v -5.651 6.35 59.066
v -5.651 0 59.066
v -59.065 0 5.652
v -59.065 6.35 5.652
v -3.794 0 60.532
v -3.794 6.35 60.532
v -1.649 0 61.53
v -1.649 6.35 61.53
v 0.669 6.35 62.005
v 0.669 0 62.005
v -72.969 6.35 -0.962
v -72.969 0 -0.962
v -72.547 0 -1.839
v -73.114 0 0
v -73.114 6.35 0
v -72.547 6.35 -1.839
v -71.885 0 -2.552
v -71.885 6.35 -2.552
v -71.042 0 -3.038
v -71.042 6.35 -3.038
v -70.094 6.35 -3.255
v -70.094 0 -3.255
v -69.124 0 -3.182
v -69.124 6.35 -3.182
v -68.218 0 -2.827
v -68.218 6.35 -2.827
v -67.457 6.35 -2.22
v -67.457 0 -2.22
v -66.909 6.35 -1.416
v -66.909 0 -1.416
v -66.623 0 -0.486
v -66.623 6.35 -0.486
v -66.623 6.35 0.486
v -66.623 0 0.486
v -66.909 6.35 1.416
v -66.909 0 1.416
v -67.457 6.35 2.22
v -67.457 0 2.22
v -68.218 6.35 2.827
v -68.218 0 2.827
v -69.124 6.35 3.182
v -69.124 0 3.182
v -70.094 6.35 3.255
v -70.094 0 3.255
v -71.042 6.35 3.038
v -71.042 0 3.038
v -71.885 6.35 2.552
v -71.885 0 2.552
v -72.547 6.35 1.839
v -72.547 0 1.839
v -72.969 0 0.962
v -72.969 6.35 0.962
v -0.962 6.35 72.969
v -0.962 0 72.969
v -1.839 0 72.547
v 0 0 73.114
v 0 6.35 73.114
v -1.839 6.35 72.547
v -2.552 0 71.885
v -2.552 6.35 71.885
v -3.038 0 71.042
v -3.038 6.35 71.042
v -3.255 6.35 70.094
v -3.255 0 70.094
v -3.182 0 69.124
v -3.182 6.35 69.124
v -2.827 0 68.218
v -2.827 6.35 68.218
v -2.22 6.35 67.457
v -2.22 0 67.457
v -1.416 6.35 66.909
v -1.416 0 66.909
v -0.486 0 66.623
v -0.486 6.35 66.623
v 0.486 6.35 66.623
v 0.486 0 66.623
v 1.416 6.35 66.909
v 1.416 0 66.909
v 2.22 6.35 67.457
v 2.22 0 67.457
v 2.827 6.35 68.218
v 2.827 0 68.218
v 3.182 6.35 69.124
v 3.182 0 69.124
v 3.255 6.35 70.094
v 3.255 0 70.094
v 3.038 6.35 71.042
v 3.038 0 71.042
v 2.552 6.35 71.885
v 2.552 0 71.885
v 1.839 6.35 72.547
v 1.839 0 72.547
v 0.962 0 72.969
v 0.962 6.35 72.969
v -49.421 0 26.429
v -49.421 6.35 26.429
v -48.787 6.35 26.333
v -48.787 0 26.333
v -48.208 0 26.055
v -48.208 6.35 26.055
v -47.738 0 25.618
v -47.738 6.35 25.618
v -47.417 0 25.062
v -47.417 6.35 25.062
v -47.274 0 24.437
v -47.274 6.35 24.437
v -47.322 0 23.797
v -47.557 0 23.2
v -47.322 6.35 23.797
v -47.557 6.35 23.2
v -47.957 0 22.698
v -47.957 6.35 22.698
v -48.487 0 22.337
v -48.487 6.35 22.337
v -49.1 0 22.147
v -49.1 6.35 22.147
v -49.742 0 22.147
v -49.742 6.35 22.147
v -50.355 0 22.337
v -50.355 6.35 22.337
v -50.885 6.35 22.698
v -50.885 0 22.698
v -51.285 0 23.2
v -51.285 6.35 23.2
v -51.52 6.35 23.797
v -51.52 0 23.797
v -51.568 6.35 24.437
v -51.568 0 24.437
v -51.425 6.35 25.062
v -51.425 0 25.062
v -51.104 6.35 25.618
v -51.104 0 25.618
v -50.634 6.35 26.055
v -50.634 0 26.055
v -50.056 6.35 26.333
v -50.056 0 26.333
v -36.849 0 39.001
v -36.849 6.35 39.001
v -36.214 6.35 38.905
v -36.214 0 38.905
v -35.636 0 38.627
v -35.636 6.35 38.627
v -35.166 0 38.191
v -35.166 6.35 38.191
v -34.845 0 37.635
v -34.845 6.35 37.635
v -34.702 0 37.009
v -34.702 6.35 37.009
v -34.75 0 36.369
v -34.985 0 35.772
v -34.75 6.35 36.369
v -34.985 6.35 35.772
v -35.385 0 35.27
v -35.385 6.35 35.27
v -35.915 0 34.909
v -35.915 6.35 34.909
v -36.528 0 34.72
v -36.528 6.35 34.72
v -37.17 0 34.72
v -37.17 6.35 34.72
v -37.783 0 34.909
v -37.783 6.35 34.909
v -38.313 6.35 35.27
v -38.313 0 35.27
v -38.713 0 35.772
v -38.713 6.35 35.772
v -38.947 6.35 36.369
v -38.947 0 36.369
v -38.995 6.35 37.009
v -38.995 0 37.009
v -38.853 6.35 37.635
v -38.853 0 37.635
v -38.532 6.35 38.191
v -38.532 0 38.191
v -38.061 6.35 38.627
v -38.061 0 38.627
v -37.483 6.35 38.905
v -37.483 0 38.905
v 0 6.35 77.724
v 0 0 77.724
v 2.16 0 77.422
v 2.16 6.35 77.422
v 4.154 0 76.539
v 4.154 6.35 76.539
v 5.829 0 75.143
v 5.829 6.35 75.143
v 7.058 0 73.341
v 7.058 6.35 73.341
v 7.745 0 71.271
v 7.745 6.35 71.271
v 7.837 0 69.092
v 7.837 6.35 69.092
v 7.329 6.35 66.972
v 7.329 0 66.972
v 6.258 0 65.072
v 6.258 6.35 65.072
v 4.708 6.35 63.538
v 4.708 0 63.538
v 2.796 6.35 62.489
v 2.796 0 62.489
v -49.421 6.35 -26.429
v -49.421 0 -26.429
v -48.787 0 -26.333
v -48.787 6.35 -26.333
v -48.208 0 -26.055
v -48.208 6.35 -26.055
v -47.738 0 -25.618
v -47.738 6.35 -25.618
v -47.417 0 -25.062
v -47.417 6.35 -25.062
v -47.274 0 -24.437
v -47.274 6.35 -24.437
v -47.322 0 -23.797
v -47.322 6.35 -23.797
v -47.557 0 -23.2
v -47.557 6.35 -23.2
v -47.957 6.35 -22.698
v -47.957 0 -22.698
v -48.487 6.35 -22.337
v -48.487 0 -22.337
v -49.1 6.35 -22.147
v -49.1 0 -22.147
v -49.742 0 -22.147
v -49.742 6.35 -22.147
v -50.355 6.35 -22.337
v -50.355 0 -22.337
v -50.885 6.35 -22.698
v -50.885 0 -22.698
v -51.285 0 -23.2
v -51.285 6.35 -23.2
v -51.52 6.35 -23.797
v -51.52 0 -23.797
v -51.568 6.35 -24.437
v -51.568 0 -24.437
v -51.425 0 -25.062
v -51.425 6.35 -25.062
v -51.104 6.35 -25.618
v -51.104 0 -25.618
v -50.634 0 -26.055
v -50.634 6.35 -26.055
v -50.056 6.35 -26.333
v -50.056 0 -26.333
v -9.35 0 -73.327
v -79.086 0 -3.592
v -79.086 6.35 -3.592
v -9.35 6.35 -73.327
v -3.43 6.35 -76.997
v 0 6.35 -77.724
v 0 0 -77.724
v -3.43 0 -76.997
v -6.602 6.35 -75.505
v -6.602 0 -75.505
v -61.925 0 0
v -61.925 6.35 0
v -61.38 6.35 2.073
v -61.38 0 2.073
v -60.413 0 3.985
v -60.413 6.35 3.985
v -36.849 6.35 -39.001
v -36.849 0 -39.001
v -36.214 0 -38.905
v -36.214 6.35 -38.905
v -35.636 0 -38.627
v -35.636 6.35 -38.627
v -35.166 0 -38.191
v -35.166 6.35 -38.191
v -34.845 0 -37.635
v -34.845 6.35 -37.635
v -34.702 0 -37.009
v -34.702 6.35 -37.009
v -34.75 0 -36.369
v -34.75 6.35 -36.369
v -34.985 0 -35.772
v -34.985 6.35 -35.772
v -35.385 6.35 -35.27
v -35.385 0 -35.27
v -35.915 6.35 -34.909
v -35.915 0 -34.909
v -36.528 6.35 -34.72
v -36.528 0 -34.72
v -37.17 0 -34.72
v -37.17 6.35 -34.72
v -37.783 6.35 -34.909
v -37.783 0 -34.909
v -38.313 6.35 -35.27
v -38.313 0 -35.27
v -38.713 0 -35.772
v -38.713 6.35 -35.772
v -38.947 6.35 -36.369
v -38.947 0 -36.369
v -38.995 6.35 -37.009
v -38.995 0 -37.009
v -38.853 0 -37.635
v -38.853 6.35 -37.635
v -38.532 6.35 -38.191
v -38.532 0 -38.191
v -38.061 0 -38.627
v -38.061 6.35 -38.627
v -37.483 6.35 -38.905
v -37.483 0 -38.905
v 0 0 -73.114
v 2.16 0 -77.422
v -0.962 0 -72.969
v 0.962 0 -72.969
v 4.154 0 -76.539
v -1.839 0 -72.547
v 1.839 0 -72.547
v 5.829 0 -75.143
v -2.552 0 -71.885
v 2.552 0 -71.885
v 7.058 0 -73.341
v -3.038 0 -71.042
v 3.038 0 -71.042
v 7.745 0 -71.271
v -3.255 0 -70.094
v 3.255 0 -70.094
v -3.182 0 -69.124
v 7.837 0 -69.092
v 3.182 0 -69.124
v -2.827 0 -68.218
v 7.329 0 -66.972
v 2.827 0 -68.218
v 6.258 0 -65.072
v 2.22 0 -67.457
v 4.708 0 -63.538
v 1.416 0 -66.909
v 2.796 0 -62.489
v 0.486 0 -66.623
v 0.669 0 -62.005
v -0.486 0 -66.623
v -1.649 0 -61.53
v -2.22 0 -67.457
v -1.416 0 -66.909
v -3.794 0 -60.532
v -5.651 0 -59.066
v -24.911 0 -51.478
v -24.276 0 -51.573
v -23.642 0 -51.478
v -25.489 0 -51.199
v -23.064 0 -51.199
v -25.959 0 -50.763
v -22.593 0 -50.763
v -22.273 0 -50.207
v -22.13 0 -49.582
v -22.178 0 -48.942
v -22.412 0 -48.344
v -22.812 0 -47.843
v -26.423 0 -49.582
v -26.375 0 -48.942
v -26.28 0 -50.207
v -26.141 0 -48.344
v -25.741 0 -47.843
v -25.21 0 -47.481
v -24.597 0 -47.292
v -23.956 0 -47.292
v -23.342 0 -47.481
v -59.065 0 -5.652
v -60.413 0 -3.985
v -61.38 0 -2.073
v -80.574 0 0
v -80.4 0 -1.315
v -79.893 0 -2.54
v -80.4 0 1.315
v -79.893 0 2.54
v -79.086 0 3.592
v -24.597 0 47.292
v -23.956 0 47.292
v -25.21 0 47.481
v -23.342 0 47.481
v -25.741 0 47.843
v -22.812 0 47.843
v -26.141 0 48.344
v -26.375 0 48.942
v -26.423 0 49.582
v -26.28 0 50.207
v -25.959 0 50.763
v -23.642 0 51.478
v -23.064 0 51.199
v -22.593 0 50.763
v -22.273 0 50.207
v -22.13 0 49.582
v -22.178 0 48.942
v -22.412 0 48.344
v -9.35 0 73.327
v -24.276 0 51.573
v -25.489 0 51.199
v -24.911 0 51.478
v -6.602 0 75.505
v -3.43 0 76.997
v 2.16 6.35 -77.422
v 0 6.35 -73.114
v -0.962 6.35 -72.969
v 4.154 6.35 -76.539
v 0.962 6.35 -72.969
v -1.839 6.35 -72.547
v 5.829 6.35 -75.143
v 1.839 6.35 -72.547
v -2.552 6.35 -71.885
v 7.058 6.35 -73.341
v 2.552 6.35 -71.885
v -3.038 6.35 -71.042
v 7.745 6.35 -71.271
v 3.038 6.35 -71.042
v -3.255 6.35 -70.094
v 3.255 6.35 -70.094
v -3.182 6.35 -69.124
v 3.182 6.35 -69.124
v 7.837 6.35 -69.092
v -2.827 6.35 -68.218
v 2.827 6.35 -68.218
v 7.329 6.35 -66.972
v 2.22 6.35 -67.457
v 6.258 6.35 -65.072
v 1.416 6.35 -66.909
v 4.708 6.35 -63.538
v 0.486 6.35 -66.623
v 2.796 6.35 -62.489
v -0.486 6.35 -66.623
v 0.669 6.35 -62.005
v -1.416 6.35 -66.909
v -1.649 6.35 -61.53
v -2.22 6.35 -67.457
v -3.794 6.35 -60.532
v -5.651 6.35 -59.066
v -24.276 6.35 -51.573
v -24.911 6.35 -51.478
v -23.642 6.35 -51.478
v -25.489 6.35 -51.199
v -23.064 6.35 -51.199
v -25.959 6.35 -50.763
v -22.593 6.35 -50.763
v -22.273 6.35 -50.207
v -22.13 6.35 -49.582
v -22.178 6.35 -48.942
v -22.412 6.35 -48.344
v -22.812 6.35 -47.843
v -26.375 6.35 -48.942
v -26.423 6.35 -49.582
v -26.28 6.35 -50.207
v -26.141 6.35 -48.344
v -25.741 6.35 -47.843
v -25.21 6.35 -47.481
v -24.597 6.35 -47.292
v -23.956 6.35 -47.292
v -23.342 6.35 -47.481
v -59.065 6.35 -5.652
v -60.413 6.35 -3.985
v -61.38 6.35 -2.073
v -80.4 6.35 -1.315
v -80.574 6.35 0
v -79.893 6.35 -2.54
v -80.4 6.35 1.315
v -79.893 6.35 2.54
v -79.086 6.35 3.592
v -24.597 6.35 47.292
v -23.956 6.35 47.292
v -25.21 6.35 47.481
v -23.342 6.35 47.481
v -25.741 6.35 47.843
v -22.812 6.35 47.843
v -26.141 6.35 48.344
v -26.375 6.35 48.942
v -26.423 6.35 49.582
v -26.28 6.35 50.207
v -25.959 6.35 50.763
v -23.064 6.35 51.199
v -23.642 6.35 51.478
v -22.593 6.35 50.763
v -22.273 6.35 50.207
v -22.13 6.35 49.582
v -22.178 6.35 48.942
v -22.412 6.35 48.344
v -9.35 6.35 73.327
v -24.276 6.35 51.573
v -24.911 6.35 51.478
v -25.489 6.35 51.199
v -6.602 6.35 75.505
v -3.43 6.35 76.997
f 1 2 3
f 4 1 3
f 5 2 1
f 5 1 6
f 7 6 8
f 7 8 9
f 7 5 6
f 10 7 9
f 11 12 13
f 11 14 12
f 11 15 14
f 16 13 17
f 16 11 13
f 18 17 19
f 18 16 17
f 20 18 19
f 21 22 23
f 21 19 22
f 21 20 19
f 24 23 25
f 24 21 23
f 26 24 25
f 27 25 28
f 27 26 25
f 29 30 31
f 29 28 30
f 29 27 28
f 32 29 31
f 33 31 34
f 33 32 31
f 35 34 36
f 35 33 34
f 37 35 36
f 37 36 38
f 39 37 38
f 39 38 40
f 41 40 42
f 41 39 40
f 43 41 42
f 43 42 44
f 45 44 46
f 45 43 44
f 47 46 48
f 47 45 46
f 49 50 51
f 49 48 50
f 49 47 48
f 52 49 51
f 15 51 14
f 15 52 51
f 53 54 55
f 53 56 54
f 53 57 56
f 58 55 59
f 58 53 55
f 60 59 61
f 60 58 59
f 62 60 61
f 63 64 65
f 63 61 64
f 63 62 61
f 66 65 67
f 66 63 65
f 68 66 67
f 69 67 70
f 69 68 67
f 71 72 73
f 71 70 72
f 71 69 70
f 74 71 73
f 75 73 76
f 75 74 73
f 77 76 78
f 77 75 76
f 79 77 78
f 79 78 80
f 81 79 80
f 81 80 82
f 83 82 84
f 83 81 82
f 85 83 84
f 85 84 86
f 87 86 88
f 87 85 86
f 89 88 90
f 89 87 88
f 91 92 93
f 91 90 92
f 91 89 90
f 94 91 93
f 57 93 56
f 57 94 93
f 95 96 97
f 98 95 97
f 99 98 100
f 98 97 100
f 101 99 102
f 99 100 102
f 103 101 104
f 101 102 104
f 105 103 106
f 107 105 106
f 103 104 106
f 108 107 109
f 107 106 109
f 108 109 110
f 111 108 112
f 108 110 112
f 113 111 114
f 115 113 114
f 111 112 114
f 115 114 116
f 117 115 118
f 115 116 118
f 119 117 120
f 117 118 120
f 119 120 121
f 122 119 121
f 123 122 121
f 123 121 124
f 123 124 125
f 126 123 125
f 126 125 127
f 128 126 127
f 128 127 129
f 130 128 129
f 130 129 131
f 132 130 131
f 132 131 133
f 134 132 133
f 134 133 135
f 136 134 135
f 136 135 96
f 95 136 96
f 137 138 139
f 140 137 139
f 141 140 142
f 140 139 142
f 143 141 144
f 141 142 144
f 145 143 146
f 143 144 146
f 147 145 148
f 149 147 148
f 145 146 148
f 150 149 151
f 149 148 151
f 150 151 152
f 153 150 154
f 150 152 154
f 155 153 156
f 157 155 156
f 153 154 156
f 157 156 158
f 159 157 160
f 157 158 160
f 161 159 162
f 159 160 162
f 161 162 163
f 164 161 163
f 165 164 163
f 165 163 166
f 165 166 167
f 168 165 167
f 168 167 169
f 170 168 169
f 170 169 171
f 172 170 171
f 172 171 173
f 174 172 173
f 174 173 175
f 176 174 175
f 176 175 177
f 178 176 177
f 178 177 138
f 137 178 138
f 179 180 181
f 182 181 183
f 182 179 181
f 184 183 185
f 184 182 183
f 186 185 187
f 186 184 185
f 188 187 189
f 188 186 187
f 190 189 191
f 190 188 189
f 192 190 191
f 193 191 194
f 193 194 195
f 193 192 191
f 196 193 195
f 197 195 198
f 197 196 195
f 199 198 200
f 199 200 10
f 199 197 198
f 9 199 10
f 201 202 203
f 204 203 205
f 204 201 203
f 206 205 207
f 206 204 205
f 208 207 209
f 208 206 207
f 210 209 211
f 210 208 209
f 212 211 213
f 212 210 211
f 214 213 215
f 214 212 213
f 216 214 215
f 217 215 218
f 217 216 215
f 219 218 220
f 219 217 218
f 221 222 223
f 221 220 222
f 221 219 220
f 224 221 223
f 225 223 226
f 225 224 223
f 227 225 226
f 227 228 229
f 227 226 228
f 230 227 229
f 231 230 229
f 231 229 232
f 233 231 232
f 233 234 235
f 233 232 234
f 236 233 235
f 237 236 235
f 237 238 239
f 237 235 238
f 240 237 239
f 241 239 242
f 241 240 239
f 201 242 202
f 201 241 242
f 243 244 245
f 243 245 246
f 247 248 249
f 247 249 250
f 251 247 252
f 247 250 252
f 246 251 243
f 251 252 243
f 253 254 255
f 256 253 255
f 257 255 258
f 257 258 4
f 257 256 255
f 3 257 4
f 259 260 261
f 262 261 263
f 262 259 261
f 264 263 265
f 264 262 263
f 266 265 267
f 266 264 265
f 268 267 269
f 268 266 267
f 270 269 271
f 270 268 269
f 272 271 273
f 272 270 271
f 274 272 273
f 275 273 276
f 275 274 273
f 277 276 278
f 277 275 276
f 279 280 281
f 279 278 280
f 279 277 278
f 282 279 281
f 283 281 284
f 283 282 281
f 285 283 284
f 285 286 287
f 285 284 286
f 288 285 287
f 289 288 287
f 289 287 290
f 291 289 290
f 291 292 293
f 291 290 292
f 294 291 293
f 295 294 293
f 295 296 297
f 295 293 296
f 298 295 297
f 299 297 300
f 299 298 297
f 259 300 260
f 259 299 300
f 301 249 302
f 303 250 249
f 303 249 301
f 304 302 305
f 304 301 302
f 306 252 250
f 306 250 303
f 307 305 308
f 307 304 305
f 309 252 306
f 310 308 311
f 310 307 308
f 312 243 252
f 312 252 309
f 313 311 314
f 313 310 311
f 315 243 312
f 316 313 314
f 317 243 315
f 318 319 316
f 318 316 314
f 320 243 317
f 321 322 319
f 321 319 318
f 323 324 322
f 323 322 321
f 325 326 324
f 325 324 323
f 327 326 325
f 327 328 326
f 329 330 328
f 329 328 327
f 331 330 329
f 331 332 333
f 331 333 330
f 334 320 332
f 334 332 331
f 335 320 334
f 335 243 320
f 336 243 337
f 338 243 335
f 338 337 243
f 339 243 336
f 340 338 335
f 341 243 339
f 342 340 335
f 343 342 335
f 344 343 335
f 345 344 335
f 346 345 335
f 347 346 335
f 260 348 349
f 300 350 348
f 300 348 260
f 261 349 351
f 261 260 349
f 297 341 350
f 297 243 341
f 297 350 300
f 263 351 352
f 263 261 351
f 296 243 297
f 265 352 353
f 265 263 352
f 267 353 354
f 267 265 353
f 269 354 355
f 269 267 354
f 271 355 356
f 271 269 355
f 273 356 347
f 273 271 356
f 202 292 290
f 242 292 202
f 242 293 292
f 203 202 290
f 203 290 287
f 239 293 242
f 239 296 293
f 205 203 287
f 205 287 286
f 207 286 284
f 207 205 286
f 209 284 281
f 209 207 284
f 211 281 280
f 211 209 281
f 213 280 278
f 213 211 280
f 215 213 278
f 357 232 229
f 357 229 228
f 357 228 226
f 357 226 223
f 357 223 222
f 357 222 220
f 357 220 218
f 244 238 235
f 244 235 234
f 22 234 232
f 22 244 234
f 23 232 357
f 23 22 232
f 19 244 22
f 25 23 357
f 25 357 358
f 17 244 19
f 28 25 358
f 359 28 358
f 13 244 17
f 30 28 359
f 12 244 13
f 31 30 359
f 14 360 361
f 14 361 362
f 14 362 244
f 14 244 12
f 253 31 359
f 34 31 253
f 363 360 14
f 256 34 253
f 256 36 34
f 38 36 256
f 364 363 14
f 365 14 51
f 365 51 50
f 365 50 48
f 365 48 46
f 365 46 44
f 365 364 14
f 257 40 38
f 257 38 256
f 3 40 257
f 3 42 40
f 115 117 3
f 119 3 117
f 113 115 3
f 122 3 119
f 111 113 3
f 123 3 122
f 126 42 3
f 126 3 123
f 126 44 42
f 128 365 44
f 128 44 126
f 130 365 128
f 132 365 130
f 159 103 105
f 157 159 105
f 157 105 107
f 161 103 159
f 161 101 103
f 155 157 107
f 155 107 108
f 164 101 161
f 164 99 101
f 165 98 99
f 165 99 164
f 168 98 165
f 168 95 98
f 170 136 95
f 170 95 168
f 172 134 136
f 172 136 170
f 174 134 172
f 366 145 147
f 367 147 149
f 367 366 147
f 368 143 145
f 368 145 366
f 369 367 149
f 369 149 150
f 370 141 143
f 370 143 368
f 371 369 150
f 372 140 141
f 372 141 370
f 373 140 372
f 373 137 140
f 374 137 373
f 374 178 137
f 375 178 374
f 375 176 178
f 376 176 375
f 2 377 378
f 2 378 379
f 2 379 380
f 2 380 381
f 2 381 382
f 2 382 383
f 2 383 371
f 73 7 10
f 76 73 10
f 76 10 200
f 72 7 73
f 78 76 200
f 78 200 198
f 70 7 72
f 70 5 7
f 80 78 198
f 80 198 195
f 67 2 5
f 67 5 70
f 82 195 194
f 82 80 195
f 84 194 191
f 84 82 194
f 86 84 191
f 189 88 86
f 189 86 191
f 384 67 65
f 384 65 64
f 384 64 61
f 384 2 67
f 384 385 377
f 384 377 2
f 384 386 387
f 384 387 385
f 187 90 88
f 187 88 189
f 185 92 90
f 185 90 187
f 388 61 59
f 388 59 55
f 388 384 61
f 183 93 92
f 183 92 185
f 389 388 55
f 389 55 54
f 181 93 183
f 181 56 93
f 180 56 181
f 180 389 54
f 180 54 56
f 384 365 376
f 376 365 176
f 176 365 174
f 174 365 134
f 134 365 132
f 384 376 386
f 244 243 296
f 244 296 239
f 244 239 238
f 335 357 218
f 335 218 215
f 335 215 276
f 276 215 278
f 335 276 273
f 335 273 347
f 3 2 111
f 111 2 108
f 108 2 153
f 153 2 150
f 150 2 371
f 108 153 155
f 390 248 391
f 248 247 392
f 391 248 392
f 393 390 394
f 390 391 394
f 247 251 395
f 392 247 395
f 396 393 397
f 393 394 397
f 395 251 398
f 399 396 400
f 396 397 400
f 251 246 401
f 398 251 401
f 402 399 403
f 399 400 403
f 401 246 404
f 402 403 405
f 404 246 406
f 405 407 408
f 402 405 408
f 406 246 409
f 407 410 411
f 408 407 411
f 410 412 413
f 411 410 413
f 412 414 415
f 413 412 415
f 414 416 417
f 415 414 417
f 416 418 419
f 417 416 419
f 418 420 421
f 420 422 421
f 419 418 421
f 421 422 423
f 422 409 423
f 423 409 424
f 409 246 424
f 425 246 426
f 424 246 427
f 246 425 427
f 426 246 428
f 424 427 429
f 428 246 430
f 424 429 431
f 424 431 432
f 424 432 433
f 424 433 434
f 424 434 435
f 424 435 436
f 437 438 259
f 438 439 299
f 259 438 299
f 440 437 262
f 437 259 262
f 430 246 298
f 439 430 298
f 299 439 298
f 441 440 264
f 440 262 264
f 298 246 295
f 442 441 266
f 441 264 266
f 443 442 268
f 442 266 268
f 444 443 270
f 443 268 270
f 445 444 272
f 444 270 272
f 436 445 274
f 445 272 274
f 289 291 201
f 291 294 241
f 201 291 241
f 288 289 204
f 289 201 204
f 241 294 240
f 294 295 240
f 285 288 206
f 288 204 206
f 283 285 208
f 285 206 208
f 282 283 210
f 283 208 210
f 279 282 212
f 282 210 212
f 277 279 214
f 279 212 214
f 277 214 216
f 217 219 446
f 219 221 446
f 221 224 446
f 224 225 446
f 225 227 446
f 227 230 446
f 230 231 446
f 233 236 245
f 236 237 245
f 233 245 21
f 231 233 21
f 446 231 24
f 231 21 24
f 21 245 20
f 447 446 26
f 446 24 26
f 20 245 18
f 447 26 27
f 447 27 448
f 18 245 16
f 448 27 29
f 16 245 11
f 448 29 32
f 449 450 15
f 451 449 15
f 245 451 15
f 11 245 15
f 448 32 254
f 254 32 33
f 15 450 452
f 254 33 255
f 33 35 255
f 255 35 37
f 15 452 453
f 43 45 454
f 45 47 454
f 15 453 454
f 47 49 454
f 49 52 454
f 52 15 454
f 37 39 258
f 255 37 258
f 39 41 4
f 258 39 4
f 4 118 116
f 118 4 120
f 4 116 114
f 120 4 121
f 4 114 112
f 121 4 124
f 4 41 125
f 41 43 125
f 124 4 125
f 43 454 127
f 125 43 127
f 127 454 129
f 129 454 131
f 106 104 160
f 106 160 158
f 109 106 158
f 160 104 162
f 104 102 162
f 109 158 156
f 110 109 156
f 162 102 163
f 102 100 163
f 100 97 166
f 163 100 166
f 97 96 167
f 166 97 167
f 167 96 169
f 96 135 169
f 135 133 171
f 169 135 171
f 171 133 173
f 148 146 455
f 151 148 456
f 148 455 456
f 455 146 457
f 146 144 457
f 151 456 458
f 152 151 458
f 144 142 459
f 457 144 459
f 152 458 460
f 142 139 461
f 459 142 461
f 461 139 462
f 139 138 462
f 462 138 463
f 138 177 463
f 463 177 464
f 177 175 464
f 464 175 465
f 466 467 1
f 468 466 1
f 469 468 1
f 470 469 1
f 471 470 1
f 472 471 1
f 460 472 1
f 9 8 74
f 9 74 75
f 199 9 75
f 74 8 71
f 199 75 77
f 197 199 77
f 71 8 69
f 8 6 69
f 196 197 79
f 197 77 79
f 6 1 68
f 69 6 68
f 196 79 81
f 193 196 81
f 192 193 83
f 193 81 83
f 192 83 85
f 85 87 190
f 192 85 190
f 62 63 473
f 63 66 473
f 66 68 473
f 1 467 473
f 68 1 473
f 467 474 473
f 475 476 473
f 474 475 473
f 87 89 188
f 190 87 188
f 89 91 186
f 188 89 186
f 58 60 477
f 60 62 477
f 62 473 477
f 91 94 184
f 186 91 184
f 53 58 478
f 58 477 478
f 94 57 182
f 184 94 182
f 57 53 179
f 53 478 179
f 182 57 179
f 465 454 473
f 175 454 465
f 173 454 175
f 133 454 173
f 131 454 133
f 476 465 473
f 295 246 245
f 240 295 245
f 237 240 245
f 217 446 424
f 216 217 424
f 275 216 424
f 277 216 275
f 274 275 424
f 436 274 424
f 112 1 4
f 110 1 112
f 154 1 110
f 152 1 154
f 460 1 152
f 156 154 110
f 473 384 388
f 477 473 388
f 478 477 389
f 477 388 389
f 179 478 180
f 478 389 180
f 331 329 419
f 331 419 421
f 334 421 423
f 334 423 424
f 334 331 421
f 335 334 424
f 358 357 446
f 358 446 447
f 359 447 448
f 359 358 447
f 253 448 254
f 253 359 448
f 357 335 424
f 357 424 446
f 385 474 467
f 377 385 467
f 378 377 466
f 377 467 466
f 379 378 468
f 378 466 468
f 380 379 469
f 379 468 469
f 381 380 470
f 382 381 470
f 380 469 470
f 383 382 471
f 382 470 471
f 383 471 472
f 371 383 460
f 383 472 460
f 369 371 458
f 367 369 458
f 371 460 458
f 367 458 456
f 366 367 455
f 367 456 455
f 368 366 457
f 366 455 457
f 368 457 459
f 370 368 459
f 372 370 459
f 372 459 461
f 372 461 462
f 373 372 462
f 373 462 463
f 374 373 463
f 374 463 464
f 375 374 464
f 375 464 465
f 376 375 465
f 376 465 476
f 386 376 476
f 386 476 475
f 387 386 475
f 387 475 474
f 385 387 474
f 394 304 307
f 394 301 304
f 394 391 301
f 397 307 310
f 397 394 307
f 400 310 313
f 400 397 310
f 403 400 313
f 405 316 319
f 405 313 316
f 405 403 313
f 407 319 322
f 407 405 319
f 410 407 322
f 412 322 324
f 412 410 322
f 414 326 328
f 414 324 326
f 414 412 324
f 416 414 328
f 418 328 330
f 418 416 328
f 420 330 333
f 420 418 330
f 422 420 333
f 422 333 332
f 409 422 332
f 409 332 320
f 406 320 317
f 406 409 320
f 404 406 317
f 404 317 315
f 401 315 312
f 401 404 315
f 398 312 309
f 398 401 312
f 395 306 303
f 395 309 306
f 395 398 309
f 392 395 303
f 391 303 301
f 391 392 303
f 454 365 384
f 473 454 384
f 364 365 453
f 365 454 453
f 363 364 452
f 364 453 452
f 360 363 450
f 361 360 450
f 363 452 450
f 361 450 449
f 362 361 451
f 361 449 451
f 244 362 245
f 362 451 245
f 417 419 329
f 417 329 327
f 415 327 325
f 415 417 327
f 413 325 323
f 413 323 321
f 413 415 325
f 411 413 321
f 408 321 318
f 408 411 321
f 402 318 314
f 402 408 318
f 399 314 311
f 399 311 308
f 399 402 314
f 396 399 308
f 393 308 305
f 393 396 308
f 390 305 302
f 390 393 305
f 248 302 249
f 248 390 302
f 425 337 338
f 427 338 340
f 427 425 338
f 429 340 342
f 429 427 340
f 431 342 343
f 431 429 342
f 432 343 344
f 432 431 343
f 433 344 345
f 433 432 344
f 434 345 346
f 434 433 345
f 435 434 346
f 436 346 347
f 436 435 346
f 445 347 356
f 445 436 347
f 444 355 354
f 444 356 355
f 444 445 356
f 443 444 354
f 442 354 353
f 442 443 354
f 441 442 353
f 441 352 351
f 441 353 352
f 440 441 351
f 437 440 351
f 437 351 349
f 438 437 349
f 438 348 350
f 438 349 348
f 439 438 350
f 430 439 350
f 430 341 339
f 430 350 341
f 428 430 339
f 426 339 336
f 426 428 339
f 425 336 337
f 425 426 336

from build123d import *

# Parameters (mm, degrees)
BOSS_EXTRUDE2_DEPTH = 6.35
SKETCH6_R           = 7.874
BOSS_EXTRUDE3_DEPTH = 6.35
CIRPATTERN1_COUNT   = 3
CIRPATTERN1_ANGLE   = 180
SKETCH7_R           = 2.15265
CUT_EXTRUDE1_DEPTH  = 118.095768176
FILLET1_R           = 15.24
FILLET2_R           = 10.16
FILLET3_R           = 5.08


with BuildPart() as part:
    # Sketch1 → Boss-Extrude2 (new body)
    with BuildSketch(Plane(origin=(0, 0, 0), x_dir=(1, 0, 0), z_dir=(0, 1, 0))):
        Polygon((-82.677748493, 0), (0, -82.677), (0, -64.716569057), (-64.71715495, 0), align=None)
    boss_extrude2 = extrude(amount=BOSS_EXTRUDE2_DEPTH)

    # Mirror1: Boss-Extrude2 across plane
    add(boss_extrude2.mirror(Plane.XY))

    # Sketch6 → Boss-Extrude3 (add)
    with BuildSketch(Plane(origin=(0, 6.35, 0), x_dir=(1, 0, 0), z_dir=(0, 1, 0))):
        with Locations((0, -69.85)):
            Circle(SKETCH6_R)
    boss_extrude3 = extrude(amount=-BOSS_EXTRUDE3_DEPTH)

    # Sketch5 → F (0.257) Diameter Hole1 (revolve, cut)
    with BuildSketch(Plane(origin=(0, 6.35, 69.85), x_dir=(0, 0, 1), z_dir=(1, 0, 0))):
        Polygon((0, 0), (0, 52.761148974), (3.2639, 50.8), (3.2639, 0), align=None)
    f_0_257_diameter_hole1 = revolve(axis=Axis((0, 12.7, 69.85), (0, -1, 0)), mode=Mode.SUBTRACT)

    # CirPattern1: Boss-Extrude3, F (0.257) Diameter Hole1 ×3 about axis
    cirpattern1_axis = Axis((0, 0, 0), (0, -1, 0))
    add([boss_extrude3.rotate(cirpattern1_axis, i * CIRPATTERN1_ANGLE / (CIRPATTERN1_COUNT - 1)) for i in range(1, CIRPATTERN1_COUNT)])
    add([f_0_257_diameter_hole1.rotate(cirpattern1_axis, i * CIRPATTERN1_ANGLE / (CIRPATTERN1_COUNT - 1)) for i in range(1, CIRPATTERN1_COUNT)], mode=Mode.SUBTRACT)

    # Sketch7 → Cut-Extrude1 (cut, through all)
    with BuildSketch(Plane(origin=(0, 6.35, 0), x_dir=(1, 0, 0), z_dir=(0, 1, 0))):
        with Locations(Location((-36.848766511, -36.848351615, 0), (0, 0, 270))):
            Circle(SKETCH7_R)
        with Locations(Location((-49.42112508, -24.275993045, 0), (0, 0, 270))):
            Circle(SKETCH7_R)
        with Locations(Location((-24.276407941, -49.420710184, 0), (0, 0, 270))):
            Circle(SKETCH7_R)
    cut_extrude1 = extrude(amount=-CUT_EXTRUDE1_DEPTH, mode=Mode.SUBTRACT)

    # Mirror2: Cut-Extrude1 across plane
    add(cut_extrude1.mirror(Plane.XY), mode=Mode.SUBTRACT)

    # Fillet1
    # the kernel refuses this fillet: 15.24 mm, written as the material it takes off along each edge
    with BuildSketch(Plane(origin=(0, -33.056477591, 82.677), x_dir=(-0.7071099819596415, 0, -0.707103580398965), z_dir=(0, 1, 0))) as fillet1_piece_1:
        with BuildLine():
            CenterArc((13.222591036, -15.24), FILLET1_R, 90, 39.629113094)
            Line((3.502284034, -3.502315741), (0, 0))
            Line((0, 0), (13.222591036, 0))
        make_face()
    extrude(amount=72.462955182, mode=Mode.SUBTRACT)
    with BuildSketch(Plane(origin=(0, -33.056477591, -82.677), x_dir=(-0.7071099819596415, 0, 0.707103580398965), z_dir=(0, 1, 0))) as fillet1_piece_2:
        with BuildLine():
            CenterArc((13.222591036, 15.24), FILLET1_R, 230.370886906, 39.629113094)
            Line((3.502284034, 3.502315741), (0, 0))
            Line((0, 0), (13.222591036, 0))
        make_face()
    extrude(amount=72.462955182, mode=Mode.SUBTRACT)

    # Fillet2
    # the kernel refuses this fillet: 10.16 mm, written as the material it adds along each edge
    with BuildSketch(Plane(origin=(-62.342579148, 0, 2.374554305), x_dir=(0.11040173938387075, 0, -0.9938870438540871), z_dir=(0, 1, 0))) as fillet2_piece_1:
        with BuildLine():
            CenterArc((5.03816312, -9.966042895), FILLET2_R, 101.213390693, 40.125343256)
            Line((-2.895302495, -3.618939355), (0, 0))
            ThreePointArc((0, 0), (1.531206438, -0.150316757), (3.062412877, 0))
        make_face()
    extrude(amount=6.35)
    with BuildSketch(Plane(origin=(-62.342579148, 0, -2.374554305), x_dir=(0.7071099819596407, 0, -0.7071035803989658), z_dir=(0, 1, 0))) as fillet2_piece_2:
        with BuildLine():
            CenterArc((4.634597997, -10.16), FILLET2_R, 90, 40.125343256)
            ThreePointArc((-1.913135001, -2.391294021), (-0.839192223, -1.289552131), (0, 0))
            Line((0, 0), (4.634597997, 0))
        make_face()
    extrude(amount=6.35)
    with BuildSketch(Plane(origin=(-2.374141848, 0, -62.342448702), x_dir=(0.9938916997559154, 0, 0.11035981676451387), z_dir=(0, 1, 0))) as fillet2_piece_3:
        with BuildLine():
            CenterArc((5.037838868, -9.966068103), FILLET2_R, 101.212659653, 40.12313883)
            Line((-2.895301552, -3.618558112), (0, 0))
            ThreePointArc((0, 0), (1.531107891, -0.150297221), (3.062215783, 0))
        make_face()
    extrude(amount=6.35)
    with BuildSketch(Plane(origin=(-2.374141848, 0, 62.342448702), x_dir=(-0.7071099819596428, 0, -0.7071035803989636), z_dir=(0, 1, 0))) as fillet2_piece_4:
        with BuildLine():
            CenterArc((4.634299719, -10.16), FILLET2_R, 90, 40.12313883)
            ThreePointArc((-1.913134377, -2.391042106), (-0.839211976, -1.289419981), (0, 0))
            Line((0, 0), (4.634299719, 0))
        make_face()
    extrude(amount=6.35)

    # Fillet3
    fillet3_edges = [part.edges().sort_by_distance(p)[0] for p in [
        (-82.677748493, 3.175, 0),
    ]]
    fillet(fillet3_edges, radius=FILLET3_R)


solid = part.part
